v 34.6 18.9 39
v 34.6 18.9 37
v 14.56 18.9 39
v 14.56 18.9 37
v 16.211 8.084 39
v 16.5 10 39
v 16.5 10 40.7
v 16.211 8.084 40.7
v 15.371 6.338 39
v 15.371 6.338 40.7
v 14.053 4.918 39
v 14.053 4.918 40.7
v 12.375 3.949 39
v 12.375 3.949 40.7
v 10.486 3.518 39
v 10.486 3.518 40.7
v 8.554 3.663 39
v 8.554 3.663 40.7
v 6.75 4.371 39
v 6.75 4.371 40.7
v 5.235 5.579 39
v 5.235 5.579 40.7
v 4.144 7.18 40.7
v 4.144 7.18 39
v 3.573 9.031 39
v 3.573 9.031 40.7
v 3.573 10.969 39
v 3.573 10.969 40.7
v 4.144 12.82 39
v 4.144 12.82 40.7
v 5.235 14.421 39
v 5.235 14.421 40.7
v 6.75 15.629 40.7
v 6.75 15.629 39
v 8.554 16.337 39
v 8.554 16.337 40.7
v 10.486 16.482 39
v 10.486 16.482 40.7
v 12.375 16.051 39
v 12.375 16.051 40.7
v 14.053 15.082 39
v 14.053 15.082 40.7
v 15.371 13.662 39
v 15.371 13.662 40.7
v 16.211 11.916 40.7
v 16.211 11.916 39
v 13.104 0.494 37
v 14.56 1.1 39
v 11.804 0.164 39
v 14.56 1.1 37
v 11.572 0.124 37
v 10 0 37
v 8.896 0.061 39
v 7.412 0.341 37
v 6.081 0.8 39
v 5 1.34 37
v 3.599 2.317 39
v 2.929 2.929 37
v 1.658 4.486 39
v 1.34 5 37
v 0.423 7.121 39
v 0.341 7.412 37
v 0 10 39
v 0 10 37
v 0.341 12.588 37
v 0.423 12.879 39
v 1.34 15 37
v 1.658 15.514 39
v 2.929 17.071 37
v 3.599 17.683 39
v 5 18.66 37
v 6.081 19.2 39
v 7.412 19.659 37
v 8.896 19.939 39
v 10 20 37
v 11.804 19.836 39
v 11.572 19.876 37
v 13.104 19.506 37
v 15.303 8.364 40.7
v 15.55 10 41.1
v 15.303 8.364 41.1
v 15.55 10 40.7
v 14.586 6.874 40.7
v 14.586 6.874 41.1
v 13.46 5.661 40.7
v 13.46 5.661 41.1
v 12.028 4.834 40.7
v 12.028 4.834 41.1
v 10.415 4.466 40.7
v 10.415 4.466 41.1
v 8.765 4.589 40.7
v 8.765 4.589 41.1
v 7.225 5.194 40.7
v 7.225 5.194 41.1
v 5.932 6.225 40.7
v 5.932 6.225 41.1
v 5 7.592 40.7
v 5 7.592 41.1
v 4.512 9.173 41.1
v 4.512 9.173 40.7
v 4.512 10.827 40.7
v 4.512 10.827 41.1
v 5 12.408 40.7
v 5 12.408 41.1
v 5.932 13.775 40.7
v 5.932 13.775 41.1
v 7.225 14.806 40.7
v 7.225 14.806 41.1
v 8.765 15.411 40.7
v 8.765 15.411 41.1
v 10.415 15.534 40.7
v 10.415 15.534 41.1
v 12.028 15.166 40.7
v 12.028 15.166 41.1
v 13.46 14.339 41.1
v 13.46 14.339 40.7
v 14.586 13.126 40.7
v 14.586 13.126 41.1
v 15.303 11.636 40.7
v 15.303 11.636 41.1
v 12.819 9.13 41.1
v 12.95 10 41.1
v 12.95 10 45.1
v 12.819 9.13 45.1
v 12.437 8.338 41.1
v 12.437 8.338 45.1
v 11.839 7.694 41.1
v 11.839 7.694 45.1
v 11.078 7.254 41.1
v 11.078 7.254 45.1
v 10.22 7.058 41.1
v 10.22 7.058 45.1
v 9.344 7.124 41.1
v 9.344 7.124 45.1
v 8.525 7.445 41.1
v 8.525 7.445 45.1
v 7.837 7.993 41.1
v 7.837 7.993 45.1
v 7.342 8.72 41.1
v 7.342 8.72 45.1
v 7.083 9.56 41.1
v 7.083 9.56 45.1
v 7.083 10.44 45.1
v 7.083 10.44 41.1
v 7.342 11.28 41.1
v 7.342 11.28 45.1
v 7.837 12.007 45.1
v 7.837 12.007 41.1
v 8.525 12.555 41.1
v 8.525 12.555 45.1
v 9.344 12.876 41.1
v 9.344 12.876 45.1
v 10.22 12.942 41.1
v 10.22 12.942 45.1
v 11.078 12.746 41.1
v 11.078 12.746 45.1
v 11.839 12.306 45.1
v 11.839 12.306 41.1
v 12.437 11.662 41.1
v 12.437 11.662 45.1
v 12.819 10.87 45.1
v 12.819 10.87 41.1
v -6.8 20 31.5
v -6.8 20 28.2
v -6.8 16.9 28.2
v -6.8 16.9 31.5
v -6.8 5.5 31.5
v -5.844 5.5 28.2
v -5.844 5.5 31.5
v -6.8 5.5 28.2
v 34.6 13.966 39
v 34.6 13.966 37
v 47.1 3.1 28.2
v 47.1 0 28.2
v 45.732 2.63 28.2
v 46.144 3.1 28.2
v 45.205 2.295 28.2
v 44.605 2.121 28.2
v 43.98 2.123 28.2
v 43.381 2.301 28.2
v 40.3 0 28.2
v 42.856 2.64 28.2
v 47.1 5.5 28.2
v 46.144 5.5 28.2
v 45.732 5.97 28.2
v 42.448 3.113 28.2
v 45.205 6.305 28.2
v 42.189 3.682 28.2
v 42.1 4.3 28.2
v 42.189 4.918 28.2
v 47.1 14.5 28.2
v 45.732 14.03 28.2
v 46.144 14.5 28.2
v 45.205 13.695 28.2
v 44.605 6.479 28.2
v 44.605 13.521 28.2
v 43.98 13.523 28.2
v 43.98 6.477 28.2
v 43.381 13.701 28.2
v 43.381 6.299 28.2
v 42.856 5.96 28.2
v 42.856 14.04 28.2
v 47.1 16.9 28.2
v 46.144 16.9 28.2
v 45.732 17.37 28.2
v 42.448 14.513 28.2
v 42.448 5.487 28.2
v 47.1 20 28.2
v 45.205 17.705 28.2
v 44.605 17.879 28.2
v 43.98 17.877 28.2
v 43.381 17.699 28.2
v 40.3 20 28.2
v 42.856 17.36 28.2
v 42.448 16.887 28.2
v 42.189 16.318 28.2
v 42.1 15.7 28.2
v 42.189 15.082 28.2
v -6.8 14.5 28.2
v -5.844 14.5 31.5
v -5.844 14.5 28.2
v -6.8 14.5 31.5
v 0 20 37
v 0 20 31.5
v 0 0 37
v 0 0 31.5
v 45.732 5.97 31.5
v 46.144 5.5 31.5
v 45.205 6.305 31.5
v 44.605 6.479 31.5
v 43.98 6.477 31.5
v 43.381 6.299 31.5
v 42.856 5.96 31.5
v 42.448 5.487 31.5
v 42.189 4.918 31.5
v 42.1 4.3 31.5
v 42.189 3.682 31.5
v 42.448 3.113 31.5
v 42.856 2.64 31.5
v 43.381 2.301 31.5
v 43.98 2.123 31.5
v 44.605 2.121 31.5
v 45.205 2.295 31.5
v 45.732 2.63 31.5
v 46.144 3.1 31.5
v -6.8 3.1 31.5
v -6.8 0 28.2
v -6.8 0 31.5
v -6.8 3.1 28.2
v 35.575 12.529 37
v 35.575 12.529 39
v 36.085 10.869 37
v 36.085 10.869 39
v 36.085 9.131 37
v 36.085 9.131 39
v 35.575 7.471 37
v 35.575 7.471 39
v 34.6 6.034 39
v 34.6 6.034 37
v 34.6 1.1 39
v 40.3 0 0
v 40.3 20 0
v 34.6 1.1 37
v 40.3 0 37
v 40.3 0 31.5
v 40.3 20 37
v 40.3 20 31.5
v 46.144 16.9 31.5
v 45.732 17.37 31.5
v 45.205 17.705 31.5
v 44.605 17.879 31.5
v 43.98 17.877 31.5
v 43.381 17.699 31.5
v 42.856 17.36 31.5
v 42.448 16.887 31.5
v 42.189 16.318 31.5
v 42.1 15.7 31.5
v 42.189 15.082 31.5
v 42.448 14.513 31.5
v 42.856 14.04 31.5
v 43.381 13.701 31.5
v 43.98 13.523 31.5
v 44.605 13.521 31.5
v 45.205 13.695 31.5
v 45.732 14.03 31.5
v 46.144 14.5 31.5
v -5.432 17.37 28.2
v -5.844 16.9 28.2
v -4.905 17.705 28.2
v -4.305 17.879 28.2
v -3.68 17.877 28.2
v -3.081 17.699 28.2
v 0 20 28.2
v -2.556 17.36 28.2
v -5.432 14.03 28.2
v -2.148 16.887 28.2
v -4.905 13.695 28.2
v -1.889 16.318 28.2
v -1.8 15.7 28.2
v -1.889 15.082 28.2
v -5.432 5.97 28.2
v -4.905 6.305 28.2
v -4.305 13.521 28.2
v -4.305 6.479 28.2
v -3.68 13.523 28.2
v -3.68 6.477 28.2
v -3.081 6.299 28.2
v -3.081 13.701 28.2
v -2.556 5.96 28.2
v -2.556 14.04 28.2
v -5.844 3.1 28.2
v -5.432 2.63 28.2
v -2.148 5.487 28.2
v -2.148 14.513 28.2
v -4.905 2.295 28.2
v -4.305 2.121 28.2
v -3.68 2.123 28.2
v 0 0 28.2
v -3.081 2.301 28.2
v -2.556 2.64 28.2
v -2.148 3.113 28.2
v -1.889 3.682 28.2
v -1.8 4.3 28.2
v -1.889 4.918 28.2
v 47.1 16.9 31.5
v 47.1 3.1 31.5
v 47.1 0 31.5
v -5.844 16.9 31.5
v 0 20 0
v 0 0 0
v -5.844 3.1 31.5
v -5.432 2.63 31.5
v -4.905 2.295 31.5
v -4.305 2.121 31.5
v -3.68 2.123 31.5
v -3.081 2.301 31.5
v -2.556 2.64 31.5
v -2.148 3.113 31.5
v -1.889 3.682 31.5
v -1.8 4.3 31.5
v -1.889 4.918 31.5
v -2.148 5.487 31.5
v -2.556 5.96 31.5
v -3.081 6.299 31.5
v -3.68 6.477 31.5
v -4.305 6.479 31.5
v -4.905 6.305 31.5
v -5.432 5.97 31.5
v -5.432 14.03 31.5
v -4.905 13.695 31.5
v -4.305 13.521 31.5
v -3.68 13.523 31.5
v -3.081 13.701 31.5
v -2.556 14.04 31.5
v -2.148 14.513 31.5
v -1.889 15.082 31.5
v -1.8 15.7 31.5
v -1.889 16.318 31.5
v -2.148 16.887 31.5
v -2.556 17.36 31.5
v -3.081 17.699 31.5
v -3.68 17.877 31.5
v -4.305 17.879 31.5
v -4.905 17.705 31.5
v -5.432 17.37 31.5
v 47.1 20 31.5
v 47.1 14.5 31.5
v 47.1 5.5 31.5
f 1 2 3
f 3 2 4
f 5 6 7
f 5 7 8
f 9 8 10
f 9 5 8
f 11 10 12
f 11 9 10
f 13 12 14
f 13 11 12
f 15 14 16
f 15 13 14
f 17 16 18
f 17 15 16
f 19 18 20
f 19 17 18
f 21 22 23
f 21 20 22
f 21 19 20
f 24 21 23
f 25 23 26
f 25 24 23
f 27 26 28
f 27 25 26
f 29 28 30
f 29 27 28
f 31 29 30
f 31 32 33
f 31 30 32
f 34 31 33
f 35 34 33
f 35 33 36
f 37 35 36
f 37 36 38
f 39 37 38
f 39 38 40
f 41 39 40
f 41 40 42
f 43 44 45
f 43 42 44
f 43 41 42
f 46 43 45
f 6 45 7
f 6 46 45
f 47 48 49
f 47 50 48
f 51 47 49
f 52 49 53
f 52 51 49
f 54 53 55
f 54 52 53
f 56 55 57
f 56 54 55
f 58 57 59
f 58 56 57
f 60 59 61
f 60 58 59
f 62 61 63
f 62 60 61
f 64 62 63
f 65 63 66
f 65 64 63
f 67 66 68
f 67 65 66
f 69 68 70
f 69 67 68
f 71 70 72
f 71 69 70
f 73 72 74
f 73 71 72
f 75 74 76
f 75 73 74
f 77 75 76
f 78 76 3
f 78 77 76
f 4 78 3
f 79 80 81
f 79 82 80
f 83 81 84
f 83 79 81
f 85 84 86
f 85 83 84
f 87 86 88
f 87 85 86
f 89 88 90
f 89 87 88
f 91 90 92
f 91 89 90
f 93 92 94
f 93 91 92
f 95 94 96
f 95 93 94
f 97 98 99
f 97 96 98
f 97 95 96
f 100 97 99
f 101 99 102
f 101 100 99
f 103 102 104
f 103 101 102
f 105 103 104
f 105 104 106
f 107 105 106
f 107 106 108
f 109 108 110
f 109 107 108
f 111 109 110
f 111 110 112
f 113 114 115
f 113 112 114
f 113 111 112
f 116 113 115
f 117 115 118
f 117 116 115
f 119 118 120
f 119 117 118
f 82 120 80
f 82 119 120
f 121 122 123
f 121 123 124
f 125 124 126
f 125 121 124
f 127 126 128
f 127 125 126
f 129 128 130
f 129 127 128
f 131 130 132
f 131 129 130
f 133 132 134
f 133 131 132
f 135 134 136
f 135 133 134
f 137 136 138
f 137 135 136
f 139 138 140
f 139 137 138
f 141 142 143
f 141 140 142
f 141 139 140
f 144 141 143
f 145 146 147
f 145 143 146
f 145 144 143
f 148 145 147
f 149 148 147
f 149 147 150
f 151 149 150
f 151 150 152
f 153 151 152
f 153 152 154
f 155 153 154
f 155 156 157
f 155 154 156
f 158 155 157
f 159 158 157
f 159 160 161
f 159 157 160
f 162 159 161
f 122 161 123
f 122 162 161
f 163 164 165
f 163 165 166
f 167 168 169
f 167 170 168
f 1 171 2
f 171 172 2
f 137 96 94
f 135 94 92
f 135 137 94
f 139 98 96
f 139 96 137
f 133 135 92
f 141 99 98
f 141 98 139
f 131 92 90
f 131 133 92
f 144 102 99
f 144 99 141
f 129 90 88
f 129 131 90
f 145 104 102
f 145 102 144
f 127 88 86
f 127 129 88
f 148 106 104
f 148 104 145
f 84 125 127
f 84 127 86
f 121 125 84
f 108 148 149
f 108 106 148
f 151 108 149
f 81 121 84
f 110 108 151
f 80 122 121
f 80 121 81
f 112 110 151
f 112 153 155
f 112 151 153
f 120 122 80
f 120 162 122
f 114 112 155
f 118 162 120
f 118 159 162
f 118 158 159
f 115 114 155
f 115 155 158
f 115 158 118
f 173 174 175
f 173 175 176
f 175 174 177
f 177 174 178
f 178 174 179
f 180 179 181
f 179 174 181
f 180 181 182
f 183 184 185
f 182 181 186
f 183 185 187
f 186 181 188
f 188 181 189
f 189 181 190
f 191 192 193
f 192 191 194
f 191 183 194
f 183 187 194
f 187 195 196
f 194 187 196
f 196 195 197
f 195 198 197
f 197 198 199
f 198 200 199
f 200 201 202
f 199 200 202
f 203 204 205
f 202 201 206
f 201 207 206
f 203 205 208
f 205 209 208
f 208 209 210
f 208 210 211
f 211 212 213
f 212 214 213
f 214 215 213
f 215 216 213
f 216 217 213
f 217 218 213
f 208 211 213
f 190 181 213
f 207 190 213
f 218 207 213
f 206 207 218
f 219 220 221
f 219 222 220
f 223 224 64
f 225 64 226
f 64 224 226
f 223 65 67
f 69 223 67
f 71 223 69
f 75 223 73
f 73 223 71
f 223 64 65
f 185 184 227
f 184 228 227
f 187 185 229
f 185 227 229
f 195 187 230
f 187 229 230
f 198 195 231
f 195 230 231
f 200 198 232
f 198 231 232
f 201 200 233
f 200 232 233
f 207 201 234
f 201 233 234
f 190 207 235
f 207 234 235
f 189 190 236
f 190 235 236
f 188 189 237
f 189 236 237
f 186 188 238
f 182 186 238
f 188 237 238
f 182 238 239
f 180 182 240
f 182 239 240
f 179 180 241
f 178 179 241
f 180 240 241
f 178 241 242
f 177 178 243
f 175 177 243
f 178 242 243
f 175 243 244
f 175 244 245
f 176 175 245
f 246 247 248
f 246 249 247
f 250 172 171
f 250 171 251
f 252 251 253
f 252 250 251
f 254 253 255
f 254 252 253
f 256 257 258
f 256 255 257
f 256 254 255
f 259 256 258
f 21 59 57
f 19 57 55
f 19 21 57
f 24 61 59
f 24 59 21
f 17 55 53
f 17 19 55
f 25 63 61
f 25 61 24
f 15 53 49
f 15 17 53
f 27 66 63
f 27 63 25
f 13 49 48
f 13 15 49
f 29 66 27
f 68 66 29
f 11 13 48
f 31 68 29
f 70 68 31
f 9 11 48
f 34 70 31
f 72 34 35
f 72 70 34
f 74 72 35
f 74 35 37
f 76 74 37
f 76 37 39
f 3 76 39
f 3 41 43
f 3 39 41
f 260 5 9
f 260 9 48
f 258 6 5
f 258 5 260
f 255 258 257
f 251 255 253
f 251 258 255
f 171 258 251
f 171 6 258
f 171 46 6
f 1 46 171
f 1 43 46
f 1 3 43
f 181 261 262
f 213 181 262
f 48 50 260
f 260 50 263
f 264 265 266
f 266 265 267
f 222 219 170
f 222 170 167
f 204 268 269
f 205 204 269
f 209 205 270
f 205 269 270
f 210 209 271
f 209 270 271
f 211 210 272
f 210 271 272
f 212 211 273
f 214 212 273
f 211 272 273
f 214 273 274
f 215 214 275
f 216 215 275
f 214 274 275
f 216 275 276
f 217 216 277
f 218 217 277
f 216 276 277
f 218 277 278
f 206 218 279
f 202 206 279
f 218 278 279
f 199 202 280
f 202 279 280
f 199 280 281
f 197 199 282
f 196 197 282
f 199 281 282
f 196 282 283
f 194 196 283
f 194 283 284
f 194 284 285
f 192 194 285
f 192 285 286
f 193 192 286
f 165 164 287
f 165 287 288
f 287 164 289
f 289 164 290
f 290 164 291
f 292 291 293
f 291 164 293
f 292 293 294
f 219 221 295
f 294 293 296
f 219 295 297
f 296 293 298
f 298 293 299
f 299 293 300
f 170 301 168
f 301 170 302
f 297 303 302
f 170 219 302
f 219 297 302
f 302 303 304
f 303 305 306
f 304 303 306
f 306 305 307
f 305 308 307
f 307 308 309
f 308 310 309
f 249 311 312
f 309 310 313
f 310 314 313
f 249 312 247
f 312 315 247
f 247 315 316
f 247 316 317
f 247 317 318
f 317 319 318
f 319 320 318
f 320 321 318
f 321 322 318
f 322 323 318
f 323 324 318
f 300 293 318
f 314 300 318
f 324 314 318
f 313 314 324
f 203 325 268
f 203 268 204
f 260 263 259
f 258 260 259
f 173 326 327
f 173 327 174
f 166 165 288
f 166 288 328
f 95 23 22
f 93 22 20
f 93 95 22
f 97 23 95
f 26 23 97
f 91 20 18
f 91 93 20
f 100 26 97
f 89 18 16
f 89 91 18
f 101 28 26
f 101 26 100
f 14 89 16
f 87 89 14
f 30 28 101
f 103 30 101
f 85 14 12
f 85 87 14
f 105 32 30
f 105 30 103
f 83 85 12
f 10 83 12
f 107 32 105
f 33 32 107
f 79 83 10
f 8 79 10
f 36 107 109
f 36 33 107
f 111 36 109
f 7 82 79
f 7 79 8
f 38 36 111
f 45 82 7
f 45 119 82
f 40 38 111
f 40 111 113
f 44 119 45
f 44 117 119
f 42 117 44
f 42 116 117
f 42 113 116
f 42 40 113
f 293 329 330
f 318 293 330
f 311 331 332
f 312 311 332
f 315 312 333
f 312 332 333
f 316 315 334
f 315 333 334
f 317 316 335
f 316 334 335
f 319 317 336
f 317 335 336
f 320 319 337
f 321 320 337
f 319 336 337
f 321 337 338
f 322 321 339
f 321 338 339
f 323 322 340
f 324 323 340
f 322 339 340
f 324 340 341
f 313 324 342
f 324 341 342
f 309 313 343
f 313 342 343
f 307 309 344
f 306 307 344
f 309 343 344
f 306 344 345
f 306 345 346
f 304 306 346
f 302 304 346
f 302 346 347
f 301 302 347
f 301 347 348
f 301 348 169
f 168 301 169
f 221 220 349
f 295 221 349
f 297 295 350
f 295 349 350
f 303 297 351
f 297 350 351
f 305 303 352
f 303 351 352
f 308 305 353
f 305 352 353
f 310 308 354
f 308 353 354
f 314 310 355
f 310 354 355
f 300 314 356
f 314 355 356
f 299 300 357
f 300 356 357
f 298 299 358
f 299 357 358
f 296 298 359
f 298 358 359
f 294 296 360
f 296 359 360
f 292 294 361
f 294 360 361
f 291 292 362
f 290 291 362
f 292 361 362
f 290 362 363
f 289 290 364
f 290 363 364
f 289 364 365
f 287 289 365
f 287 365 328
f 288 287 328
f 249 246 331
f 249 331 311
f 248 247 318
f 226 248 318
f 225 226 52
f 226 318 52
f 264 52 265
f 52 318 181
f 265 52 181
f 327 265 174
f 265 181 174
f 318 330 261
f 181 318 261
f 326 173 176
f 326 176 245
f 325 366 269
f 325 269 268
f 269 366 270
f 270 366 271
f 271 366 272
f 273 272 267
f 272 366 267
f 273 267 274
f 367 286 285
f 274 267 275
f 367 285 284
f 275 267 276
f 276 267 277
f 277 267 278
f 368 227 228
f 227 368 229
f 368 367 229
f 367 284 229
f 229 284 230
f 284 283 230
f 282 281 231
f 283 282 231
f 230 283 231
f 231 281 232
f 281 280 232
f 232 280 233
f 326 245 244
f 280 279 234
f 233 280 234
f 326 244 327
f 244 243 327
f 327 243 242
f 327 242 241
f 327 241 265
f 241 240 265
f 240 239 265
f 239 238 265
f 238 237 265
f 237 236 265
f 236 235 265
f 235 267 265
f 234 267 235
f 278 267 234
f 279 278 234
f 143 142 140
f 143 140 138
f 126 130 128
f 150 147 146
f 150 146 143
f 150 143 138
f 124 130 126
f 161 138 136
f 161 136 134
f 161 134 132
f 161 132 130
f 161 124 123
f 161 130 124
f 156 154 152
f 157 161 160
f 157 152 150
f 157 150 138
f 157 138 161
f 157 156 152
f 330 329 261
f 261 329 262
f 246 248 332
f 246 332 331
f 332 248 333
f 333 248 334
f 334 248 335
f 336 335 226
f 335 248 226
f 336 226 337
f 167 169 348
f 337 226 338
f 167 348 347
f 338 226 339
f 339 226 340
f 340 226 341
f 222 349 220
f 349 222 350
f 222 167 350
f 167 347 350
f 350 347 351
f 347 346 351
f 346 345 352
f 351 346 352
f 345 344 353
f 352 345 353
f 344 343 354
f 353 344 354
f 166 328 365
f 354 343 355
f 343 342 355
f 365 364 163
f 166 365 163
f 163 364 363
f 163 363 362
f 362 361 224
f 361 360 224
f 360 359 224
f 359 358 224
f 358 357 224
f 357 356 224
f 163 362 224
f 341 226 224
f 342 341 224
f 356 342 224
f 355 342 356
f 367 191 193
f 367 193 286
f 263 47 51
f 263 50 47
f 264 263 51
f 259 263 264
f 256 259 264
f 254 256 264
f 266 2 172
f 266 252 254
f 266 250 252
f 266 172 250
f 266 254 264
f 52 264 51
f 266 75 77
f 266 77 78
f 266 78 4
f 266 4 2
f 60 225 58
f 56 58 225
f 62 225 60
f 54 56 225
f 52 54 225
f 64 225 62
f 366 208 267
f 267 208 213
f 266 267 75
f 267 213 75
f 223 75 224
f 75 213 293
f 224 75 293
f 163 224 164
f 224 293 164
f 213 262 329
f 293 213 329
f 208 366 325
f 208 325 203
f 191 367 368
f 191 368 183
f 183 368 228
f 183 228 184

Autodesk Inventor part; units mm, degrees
sketch "Sketch1" plane through (0, 0, 0) normal (0, 0, 1) x (1, 0, 0)
  line L0 (0, 0) -> (40.3, 0)
  line L1 (40.3, 0) -> (40.3, 20)
  line L2 (40.3, 20) -> (0, 20)
  line L3 (0, 20) -> (0, 0)
  dimension "d0" = 40.3
  dimension "d1" = 20
extrude "Extrusion1" add sketch "Sketch1" along normal blind 37
sketch "Sketch2" plane through (40.3, 0, 0) normal (1, 0, 0) x (0, 0, -1)
  line L0 (0, 20) -> (-37, 20) projected
  line L1 (-37, 0) -> (-37, 20) projected
  line L2 (0, 0) -> (-37, 0) projected
  line L3 (-31.5, 0) -> (-28.2, 0)
  line L4 (-28.2, 0) -> (-28.2, 20)
  line L5 (-28.2, 20) -> (-31.5, 20)
  line L6 (-31.5, 20) -> (-31.5, 0)
  dimension "d4" = 3.3
  dimension "d5" = 5.5
extrude "Extrusion2" add sketch "Sketch2" along normal blind 6.8 contours L4 L2 L6 L0
sketch "Sketch3" plane through (40.3, 0, 31.5) normal (0, 0, 1) x (1, 0, 0)
  line L0 (6.8, 20) -> (6.8, 0) projected
  line L1 (0, 20) -> (6.8, 20) projected
  circle A0 centre (4, 15.7) radius 2.2
  point P0 (-40.3, 0)
  dimension "d8" = 4.4
  dimension "d9" = 2.8
  dimension "d10" = 4.3
extrude "Extrusion3" cut sketch "Sketch3" against normal through all
ref_plane "Work Plane2" through (48.1, 0, 0) normal (1, 0, 0) x (0, 0, -1)
sketch "Sketch7" plane through (48.1, 0, 0) normal (1, 0, 0) x (0, 0, -1)
  line L0 (-31.5, 16.9) -> (-28.2, 16.9) projected
  line L1 (-28.2, 14.5) -> (-31.5, 14.5) projected
  line L2 (-31.5, 16.9) -> (-28.2, 16.9)
  line L3 (-28.2, 16.9) -> (-28.2, 14.5)
  line L4 (-28.2, 14.5) -> (-31.5, 14.5)
  line L5 (-31.5, 14.5) -> (-31.5, 16.9)
  point P0 (0, 0)
extrude "Extrusion5" cut sketch "Sketch7" against normal blind 3
ref_plane "Work Plane3" through (0, 10, 0) normal (0, 1, 0) x (-1, 0, 0)
mirror "Mirror1" about plane through (0, 10, 0) normal (0, 1, 0) of "Extrusion3", "Extrusion5"
ref_plane "Work Plane4" through (20.15, 0, 0) normal (1, 0, 0) x (0, 1, 0)
mirror "Mirror2" about plane through (20.15, 0, 0) normal (1, 0, 0) of "Extrusion2", "Extrusion3", "Extrusion5", "Mirror1"
sketch "Sketch8" plane through (0, 0, 37) normal (0, 0, 1) x (1, 0, 0)
  line L0 (40.3, 0) -> (40.3, 20) projected
  line L1 (40.3, 20) -> (0, 20) projected
  line L2 (0, 20) -> (0, 0) projected
  line L3 (34.6, 18.9) -> (14.5596, 18.9)
  line L4 (14.5596, 1.1) -> (34.6, 1.1)
  arc A0 (14.5596, 18.9) -> (14.5596, 1.1) centre (10, 10) ccw
  arc A1 (34.6, 6.0336) -> (34.6, 13.9664) centre (30.3, 10) ccw
  line L5 (34.6, 1.1) -> (34.6, 6.0336)
  line L6 (34.6, 13.9664) -> (34.6, 18.9)
  dimension "d27" = 1.1
  dimension "d29" = 20
  dimension "d30" = 10
  dimension "d31" = 11.7
  dimension "d32" = 10
extrude "Extrusion6" add sketch "Sketch8" along normal blind 2 contours A0 L3 L6 A1 L5 L4
sketch "Sketch9" plane through (0, 0, 39) normal (0, 0, 1) x (1, 0, 0)
  arc A0 (14.5596, 18.9) -> (14.5596, 1.1) centre (10, 10) ccw projected
  circle A1 centre (10, 10) radius 6.5
  point P0 (0, 0)
  dimension "d35" = 13
extrude "Extrusion7" add sketch "Sketch9" along normal blind 1.7
sketch "Sketch10" plane through (10, 10, 40.7) normal (0, 0, 1) x (1, 0, 0)
  circle A0 centre (0, 0) radius 6.5 projected
  circle A1 centre (0, 0) radius 5.55
  point P0 (-10, -10)
  dimension "d38" = 11.1
extrude "Extrusion8" add sketch "Sketch10" along normal blind 0.4 contours A1
sketch "Sketch11" plane through (10, 10, 41.1) normal (0, 0, 1) x (1, 0, 0)
  circle A0 centre (0, 0) radius 5.55 projected
  circle A1 centre (0, 0) radius 2.95
  point P0 (-10, -10)
  dimension "d41" = 5.9
extrude "Extrusion9" add sketch "Sketch11" along normal blind 4 contours A1
ref_plane "ConstraintPlane" through (10, 0, 0) normal (1, 0, 0) x (0, 1, 0)
properties part number "MG996RServo"
